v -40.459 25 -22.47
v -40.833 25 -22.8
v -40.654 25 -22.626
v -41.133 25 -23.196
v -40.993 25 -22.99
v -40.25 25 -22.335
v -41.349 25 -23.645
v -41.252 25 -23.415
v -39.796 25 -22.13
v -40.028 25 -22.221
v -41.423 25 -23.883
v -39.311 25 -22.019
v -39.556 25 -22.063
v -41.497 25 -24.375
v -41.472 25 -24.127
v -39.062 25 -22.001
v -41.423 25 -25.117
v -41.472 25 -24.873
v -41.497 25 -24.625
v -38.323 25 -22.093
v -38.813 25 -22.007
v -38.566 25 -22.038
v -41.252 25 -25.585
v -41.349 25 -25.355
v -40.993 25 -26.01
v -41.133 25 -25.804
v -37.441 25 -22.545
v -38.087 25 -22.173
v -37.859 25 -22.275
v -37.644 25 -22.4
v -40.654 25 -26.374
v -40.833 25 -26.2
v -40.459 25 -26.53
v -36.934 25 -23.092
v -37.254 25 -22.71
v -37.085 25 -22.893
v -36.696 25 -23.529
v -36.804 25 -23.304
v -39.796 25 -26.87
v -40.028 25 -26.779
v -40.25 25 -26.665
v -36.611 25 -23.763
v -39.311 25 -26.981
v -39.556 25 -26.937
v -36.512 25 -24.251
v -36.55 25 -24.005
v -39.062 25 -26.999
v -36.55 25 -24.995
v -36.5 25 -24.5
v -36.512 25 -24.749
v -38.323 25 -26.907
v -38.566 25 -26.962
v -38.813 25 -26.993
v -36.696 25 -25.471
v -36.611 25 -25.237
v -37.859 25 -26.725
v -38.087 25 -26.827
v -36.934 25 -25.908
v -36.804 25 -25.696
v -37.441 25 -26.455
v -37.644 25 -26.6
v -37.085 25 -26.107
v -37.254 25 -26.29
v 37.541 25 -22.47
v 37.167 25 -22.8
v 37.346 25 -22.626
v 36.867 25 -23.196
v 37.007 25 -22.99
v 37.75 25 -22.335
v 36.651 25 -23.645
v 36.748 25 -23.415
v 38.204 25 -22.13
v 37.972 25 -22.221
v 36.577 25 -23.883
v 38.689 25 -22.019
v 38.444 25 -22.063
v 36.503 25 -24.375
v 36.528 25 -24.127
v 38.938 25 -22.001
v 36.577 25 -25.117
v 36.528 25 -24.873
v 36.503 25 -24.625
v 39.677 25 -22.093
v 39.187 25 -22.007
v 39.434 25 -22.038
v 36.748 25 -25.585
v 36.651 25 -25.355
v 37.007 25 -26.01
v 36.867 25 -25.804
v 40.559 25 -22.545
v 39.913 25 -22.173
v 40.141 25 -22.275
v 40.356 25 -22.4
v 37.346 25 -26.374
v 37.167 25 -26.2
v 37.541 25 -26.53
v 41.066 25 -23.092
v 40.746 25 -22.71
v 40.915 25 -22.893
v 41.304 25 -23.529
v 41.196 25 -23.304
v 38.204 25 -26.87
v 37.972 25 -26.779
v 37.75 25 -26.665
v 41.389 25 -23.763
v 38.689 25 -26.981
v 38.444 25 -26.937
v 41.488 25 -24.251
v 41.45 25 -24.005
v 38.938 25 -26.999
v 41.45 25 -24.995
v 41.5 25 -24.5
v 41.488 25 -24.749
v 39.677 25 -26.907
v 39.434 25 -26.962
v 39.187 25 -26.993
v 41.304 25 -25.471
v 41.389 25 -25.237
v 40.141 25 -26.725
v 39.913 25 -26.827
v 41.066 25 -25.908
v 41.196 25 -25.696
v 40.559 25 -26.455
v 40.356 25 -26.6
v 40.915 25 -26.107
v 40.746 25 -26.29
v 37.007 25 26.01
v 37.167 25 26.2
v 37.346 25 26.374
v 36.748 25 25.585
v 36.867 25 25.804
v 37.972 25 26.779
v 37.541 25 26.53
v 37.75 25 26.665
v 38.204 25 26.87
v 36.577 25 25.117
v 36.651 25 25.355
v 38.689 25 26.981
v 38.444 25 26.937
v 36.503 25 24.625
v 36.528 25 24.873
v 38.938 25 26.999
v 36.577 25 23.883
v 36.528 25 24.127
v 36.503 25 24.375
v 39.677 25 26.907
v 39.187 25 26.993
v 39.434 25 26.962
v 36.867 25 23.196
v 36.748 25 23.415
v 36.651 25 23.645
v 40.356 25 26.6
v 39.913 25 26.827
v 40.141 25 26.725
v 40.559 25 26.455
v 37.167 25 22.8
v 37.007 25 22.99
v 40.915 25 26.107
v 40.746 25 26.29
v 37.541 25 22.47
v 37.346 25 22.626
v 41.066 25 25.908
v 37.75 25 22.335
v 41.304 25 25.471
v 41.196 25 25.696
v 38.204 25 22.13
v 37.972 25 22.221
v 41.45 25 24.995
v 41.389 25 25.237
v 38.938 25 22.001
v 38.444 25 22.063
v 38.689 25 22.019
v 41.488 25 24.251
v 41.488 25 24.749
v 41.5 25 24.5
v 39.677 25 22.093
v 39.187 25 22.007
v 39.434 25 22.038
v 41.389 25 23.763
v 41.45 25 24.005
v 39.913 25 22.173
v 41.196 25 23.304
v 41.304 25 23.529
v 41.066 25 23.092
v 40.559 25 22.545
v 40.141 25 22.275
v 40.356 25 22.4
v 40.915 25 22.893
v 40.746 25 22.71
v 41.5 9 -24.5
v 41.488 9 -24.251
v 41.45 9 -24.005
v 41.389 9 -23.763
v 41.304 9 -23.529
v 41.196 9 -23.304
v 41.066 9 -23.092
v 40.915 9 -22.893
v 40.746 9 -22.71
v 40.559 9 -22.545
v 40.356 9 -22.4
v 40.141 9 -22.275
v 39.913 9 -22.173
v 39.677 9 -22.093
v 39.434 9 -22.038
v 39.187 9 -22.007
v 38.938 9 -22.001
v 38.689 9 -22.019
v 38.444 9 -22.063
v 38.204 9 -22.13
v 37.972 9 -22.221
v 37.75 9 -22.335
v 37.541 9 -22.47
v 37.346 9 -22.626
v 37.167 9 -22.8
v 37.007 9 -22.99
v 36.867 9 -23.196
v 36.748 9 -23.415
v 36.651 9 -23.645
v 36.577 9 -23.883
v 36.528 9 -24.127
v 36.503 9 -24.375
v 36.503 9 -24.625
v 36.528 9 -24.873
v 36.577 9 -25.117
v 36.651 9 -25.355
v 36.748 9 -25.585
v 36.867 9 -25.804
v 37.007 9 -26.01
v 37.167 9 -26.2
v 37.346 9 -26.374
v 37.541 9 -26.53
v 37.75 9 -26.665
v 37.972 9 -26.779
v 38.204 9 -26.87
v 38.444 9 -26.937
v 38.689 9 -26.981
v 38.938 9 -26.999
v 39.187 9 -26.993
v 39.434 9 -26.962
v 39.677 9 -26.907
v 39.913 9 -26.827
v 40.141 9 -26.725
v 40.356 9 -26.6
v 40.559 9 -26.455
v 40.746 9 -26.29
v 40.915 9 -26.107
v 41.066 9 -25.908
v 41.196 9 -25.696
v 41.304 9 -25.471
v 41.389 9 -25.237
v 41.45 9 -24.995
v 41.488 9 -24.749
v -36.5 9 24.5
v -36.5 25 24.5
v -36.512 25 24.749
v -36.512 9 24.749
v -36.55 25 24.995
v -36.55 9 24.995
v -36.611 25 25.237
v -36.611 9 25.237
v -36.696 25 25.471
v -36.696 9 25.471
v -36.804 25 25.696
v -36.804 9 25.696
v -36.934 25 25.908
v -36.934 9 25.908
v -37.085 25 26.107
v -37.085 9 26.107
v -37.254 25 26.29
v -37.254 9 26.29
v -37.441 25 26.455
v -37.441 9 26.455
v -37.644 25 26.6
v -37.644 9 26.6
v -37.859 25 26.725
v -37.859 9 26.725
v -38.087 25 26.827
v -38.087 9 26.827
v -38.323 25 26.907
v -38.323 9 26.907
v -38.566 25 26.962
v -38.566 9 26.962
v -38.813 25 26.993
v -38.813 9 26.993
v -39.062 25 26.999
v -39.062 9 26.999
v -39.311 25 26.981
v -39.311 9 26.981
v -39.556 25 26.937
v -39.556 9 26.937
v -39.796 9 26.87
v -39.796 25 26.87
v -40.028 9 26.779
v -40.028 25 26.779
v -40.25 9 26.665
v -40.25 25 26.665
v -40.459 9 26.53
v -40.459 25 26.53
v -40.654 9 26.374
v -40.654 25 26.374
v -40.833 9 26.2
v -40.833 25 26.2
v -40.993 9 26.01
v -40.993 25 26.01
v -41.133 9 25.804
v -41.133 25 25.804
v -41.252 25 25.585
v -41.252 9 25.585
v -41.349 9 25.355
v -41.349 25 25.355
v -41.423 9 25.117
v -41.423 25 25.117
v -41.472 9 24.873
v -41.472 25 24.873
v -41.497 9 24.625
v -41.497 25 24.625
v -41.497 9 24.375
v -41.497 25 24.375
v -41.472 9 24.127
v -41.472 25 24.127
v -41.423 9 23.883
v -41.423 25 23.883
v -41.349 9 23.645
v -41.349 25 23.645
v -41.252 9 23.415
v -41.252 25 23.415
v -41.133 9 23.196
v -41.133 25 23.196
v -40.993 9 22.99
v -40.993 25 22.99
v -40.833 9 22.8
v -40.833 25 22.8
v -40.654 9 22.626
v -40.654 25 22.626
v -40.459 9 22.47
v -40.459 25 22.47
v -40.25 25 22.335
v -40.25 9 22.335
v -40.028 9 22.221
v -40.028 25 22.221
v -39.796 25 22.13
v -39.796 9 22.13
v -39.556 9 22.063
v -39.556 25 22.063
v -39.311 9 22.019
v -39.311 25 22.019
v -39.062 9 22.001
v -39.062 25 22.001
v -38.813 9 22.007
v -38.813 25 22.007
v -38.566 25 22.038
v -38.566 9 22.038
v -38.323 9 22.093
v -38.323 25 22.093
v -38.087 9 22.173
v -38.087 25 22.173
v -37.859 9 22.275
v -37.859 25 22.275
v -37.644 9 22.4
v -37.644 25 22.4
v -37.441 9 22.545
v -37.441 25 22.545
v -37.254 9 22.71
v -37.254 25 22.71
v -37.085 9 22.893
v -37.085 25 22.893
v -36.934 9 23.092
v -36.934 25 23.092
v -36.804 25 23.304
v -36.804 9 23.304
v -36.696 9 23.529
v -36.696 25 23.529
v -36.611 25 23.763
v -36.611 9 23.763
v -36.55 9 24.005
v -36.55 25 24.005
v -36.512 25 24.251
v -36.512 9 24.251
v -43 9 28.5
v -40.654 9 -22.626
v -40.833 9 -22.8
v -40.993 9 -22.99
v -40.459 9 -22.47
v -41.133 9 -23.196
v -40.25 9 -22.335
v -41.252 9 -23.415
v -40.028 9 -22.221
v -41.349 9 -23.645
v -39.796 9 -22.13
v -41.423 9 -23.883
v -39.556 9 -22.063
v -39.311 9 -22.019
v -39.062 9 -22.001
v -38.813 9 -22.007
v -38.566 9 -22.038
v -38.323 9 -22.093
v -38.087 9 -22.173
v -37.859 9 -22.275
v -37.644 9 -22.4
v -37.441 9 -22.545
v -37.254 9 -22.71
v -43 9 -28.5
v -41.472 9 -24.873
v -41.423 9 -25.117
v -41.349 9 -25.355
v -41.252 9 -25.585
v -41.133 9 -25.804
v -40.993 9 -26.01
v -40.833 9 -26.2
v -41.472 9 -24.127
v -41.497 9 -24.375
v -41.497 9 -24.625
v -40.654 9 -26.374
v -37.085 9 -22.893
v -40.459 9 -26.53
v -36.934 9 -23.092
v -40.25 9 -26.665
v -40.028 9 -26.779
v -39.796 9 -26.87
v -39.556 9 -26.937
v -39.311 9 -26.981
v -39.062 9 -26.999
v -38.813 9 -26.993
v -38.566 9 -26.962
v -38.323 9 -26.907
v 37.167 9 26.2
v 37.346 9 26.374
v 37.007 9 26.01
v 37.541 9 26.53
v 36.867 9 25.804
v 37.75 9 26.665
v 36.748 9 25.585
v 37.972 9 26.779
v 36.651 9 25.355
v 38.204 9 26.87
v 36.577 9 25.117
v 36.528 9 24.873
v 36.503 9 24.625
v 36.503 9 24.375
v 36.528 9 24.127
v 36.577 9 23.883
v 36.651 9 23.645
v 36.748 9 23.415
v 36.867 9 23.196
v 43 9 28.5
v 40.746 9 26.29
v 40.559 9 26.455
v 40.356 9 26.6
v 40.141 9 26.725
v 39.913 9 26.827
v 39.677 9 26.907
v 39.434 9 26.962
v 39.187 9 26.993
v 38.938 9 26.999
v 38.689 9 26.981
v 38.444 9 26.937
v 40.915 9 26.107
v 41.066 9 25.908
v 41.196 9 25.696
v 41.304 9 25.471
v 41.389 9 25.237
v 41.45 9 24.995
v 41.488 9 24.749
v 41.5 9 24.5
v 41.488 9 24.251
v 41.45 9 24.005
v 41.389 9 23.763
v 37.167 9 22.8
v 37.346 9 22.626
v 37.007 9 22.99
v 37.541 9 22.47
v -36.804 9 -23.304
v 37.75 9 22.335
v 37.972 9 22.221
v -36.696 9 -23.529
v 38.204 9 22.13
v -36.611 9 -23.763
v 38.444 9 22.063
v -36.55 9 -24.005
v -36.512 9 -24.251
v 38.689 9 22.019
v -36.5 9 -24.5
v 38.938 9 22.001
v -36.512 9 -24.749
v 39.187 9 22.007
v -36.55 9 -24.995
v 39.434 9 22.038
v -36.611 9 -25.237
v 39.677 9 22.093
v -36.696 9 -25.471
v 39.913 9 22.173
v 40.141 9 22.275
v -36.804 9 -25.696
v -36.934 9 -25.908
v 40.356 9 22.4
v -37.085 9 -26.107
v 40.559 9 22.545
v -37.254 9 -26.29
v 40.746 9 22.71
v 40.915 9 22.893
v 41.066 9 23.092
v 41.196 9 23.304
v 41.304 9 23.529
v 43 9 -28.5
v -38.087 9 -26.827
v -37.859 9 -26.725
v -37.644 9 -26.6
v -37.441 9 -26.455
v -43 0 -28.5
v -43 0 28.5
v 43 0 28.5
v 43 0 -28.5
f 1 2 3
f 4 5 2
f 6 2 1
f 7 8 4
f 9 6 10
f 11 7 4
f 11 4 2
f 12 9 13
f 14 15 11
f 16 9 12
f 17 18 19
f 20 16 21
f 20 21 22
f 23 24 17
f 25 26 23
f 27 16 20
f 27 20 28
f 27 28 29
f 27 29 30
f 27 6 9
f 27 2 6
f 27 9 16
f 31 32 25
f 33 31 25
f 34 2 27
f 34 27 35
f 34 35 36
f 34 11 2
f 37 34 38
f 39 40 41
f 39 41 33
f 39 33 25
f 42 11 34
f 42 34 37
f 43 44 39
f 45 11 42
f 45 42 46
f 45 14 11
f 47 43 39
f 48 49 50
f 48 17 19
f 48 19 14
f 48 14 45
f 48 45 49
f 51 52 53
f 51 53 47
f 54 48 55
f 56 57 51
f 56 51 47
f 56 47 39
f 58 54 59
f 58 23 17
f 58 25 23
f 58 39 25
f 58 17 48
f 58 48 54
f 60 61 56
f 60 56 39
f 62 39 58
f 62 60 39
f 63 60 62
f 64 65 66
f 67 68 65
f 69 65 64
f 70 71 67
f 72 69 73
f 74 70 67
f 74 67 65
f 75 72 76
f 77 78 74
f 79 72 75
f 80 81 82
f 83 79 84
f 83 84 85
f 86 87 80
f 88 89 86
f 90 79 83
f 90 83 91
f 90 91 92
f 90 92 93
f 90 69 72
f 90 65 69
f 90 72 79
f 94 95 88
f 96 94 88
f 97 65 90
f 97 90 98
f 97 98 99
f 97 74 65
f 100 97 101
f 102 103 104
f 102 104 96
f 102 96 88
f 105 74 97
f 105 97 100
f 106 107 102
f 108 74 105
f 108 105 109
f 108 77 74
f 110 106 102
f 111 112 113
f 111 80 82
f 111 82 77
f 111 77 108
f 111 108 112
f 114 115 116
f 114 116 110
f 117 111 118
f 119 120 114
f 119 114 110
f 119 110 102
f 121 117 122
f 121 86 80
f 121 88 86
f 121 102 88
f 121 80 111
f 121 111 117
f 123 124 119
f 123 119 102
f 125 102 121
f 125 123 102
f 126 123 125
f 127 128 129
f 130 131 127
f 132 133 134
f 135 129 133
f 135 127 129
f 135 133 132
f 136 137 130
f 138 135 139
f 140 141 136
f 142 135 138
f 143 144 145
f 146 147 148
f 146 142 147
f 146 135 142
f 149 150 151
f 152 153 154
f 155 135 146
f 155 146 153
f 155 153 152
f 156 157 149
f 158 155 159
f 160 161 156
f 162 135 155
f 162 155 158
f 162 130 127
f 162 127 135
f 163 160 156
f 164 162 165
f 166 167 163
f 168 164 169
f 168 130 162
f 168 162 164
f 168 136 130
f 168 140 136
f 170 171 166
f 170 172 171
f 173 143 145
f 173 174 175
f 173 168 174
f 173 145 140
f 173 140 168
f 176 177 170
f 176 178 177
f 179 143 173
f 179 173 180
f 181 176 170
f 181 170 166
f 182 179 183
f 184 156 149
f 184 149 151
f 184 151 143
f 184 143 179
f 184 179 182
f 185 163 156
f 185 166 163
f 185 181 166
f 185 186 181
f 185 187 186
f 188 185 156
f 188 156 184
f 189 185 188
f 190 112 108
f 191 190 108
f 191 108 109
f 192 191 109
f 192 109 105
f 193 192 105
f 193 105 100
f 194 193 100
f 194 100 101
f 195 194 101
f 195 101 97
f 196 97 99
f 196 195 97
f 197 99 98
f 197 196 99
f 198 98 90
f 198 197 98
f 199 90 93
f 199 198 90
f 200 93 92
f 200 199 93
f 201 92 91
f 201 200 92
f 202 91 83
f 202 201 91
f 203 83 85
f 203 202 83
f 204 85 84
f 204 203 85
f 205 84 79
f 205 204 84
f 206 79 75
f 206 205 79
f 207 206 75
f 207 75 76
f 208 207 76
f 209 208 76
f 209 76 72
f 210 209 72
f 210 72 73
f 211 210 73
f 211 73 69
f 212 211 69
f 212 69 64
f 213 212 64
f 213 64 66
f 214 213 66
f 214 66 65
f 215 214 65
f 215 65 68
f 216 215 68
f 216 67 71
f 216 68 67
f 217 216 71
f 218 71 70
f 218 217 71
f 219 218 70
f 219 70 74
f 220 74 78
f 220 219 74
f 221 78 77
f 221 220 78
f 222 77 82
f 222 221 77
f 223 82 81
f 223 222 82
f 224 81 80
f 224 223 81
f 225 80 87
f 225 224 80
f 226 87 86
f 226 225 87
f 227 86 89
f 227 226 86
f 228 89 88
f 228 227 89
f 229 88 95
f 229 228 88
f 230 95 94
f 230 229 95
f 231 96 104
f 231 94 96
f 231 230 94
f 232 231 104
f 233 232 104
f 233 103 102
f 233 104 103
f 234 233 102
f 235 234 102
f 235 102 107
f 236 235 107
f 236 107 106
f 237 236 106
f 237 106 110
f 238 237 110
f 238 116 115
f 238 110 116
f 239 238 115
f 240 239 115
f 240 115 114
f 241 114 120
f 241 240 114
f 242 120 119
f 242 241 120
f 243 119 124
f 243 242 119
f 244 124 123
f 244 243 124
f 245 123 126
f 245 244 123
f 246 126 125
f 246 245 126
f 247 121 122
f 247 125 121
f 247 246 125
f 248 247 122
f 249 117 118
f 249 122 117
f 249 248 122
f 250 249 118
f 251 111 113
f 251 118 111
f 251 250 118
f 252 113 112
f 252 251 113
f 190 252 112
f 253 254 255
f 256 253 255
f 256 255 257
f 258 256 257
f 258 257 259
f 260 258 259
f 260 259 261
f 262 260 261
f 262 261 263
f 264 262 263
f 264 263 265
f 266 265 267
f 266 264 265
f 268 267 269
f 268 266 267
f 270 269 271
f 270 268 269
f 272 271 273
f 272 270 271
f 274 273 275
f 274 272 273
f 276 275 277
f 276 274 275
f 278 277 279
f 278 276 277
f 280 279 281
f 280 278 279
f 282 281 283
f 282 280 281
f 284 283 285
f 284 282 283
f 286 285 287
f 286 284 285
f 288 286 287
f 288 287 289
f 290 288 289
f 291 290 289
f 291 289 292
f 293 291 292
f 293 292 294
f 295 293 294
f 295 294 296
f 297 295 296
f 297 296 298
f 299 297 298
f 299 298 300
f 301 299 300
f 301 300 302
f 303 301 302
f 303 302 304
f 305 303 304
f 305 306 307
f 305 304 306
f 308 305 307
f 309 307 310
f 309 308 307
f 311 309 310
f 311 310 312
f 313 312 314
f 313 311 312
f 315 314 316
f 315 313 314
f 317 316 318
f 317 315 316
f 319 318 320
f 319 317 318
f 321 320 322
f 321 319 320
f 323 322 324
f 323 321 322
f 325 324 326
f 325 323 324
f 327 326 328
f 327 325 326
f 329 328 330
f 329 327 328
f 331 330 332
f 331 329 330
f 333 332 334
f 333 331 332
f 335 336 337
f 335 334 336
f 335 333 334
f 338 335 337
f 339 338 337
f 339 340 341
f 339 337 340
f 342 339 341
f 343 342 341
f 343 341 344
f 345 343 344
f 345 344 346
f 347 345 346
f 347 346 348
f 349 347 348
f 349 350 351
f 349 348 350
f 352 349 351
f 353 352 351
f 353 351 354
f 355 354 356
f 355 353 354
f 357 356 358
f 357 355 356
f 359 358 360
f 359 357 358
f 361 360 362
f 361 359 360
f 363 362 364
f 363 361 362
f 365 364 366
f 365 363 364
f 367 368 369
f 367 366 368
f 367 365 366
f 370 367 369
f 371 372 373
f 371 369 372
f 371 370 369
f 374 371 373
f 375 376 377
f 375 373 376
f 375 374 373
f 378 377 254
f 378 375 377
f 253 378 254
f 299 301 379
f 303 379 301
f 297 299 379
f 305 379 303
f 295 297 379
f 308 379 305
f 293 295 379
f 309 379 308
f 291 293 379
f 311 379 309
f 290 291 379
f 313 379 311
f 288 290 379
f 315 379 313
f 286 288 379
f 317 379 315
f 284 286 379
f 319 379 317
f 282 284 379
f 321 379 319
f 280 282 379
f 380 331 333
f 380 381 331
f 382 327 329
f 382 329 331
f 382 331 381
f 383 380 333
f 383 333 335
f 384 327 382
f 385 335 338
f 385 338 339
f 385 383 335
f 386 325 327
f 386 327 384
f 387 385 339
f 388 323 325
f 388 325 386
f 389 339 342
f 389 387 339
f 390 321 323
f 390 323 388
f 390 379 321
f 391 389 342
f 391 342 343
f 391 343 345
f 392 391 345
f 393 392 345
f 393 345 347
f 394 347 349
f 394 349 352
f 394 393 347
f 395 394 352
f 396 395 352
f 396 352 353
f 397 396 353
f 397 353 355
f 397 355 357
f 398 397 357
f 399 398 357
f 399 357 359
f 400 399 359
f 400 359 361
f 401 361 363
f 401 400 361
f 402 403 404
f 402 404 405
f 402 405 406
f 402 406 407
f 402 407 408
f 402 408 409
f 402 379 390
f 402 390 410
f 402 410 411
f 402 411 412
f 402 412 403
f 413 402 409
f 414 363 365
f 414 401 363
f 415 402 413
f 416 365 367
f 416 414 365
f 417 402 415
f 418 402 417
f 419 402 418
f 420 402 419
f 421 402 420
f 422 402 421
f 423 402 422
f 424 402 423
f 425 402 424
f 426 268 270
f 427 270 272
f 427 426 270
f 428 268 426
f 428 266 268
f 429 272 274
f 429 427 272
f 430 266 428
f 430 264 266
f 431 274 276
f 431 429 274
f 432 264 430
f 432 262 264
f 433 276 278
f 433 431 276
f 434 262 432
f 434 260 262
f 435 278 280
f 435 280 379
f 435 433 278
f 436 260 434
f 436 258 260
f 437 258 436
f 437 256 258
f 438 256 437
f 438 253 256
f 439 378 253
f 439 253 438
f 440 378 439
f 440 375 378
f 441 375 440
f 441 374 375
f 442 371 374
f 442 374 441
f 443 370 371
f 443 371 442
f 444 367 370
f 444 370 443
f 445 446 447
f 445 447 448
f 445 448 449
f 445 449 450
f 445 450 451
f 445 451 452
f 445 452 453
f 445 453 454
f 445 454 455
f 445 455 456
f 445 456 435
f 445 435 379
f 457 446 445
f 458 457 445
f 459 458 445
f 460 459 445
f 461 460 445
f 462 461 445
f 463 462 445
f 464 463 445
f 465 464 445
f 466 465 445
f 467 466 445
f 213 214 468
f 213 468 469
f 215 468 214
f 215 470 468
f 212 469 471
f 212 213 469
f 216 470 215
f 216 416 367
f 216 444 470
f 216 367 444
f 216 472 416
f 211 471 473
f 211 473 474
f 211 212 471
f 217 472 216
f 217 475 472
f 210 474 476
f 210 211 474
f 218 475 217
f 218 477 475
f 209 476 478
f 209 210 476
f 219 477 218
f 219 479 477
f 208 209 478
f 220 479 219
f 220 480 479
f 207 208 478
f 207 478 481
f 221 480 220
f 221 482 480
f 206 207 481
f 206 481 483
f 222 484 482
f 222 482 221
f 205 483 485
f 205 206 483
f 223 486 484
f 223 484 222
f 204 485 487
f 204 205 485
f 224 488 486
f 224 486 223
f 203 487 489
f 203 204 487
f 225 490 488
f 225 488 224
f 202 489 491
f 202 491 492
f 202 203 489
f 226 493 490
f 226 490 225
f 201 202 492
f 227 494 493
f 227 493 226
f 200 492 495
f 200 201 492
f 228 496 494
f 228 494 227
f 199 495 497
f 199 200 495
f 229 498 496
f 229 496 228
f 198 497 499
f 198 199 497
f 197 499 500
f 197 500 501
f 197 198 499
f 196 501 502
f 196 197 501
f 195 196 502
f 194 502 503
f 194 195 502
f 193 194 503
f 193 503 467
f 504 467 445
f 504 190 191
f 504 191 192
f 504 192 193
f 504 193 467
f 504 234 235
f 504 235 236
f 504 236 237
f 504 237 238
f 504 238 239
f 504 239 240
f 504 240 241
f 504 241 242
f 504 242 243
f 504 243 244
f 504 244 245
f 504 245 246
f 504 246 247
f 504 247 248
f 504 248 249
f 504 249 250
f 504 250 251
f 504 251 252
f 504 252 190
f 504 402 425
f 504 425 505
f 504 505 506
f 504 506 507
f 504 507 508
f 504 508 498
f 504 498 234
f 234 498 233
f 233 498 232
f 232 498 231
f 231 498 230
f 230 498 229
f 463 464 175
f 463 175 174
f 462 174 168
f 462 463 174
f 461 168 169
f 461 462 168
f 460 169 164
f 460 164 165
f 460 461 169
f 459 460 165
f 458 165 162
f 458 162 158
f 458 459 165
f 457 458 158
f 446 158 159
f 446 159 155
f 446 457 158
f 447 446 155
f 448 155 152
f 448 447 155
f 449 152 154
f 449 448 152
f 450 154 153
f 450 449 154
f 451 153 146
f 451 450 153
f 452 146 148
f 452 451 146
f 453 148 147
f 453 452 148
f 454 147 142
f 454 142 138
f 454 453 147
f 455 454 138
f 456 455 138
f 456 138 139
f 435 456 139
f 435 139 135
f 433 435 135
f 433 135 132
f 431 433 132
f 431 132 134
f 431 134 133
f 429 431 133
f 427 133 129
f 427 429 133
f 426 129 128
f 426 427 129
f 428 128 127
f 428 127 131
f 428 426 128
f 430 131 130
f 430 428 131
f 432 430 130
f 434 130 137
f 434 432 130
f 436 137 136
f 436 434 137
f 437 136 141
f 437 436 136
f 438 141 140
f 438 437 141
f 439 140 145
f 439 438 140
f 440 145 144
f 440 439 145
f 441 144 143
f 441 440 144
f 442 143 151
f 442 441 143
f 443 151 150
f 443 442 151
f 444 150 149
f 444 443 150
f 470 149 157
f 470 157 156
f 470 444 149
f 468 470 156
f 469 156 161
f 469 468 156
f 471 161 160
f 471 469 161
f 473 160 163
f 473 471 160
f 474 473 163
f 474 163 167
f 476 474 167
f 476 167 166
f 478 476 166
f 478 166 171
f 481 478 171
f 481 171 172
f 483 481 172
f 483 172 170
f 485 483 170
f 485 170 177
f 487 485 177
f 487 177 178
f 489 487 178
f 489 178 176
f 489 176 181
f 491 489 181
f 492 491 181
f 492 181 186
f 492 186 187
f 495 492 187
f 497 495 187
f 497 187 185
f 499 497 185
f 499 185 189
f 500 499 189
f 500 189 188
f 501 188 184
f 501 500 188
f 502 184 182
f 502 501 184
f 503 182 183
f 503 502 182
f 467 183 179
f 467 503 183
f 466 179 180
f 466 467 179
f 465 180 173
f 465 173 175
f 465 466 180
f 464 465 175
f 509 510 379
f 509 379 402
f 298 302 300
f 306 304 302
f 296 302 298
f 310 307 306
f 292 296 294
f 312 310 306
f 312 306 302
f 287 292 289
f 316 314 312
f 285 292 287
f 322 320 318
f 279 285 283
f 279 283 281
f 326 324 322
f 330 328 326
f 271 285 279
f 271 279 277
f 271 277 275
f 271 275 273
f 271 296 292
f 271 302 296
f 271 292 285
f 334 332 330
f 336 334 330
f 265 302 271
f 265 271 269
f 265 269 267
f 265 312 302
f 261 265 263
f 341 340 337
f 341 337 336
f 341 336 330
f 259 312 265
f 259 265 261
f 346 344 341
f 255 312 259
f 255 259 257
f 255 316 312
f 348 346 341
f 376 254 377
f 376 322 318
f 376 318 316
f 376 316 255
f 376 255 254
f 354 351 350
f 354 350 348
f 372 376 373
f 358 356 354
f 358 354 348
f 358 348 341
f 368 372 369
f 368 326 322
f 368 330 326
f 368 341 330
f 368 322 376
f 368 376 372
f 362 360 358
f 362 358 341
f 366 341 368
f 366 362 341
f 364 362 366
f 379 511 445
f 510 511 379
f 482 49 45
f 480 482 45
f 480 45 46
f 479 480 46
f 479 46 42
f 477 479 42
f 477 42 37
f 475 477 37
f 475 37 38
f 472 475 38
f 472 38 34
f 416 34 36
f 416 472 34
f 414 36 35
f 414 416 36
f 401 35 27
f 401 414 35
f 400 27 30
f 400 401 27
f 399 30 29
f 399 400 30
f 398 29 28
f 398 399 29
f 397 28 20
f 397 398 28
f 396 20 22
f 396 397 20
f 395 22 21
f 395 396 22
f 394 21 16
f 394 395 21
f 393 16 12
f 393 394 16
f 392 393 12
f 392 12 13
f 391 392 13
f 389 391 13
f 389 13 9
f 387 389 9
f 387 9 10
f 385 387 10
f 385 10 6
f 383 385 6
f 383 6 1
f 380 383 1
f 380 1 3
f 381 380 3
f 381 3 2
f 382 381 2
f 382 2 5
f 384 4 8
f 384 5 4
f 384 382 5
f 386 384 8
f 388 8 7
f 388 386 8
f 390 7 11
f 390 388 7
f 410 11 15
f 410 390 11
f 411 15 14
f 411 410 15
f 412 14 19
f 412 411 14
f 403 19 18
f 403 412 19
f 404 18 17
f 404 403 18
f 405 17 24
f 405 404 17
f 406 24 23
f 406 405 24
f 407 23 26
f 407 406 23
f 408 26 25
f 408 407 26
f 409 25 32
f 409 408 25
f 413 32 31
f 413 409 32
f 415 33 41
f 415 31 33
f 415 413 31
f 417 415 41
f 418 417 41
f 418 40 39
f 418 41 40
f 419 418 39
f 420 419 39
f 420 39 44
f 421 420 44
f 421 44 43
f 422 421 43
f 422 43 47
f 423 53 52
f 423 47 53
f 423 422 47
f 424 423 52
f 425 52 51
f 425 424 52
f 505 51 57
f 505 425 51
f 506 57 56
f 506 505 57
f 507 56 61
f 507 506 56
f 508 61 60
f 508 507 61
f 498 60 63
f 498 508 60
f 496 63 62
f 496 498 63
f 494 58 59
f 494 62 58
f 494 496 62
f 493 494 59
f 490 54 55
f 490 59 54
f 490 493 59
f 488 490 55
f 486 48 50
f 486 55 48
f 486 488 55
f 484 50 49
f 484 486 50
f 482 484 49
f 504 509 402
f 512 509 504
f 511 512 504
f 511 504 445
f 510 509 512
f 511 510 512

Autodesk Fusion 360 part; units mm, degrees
sketch "Sketch1" plane through (0, 0, 0) normal (0, 1, 0) x (1, 0, 0)
  line L0 (43, -28.5) -> (-43, -28.5)
  line L1 (-43, -28.5) -> (-43, 28.5)
  line L2 (-43, 28.5) -> (43, 28.5)
  line L3 (43, 28.5) -> (43, -28.5)
  line L4 (43, -28.5) -> (-43, 28.5) construction
  line L5 (-43, -28.5) -> (43, 28.5) construction
  line L6 (43, -28.5) -> (39, -28.5)
  line L7 (39, -28.5) -> (39, -24.5)
  line L8 (39, -24.5) -> (43, -24.5)
  line L9 (43, -24.5) -> (43, -28.5)
  circle A0 centre (39, -24.5) radius 2.5
  line L10 (52.3114, 0) -> (-55.6196, 0)
  line L11 (0, 36.5366) -> (0, -32.8551)
  circle A1 centre (-39, -24.5) radius 2.5
  circle A2 centre (39, 24.5) radius 2.5
  circle A3 centre (-39, 24.5) radius 2.5
  dimension "d1" = 86
  dimension "d2" = 57
  dimension "d5" = 4
  dimension "d6" = 4
  dimension "d7" = 5
extrude "Extrude1" add sketch "Sketch1" along normal blind 9 contours L0 L3 L6 L7 L8 L9 A0 | L0 L3 L7 L8 A0 L10 L11 | L0 L1 L10 L11 | L7 L8 A0 | L7 L8 A0 | L2 L3 L10 L11 | L1 L2 L10 L11 | A1 | A2 | A3
extrude "Extrude2" add sketch "Sketch1" along normal blind 25 contours L7 L8 A0 | L7 L8 A0 | A1 | A2 | A3
